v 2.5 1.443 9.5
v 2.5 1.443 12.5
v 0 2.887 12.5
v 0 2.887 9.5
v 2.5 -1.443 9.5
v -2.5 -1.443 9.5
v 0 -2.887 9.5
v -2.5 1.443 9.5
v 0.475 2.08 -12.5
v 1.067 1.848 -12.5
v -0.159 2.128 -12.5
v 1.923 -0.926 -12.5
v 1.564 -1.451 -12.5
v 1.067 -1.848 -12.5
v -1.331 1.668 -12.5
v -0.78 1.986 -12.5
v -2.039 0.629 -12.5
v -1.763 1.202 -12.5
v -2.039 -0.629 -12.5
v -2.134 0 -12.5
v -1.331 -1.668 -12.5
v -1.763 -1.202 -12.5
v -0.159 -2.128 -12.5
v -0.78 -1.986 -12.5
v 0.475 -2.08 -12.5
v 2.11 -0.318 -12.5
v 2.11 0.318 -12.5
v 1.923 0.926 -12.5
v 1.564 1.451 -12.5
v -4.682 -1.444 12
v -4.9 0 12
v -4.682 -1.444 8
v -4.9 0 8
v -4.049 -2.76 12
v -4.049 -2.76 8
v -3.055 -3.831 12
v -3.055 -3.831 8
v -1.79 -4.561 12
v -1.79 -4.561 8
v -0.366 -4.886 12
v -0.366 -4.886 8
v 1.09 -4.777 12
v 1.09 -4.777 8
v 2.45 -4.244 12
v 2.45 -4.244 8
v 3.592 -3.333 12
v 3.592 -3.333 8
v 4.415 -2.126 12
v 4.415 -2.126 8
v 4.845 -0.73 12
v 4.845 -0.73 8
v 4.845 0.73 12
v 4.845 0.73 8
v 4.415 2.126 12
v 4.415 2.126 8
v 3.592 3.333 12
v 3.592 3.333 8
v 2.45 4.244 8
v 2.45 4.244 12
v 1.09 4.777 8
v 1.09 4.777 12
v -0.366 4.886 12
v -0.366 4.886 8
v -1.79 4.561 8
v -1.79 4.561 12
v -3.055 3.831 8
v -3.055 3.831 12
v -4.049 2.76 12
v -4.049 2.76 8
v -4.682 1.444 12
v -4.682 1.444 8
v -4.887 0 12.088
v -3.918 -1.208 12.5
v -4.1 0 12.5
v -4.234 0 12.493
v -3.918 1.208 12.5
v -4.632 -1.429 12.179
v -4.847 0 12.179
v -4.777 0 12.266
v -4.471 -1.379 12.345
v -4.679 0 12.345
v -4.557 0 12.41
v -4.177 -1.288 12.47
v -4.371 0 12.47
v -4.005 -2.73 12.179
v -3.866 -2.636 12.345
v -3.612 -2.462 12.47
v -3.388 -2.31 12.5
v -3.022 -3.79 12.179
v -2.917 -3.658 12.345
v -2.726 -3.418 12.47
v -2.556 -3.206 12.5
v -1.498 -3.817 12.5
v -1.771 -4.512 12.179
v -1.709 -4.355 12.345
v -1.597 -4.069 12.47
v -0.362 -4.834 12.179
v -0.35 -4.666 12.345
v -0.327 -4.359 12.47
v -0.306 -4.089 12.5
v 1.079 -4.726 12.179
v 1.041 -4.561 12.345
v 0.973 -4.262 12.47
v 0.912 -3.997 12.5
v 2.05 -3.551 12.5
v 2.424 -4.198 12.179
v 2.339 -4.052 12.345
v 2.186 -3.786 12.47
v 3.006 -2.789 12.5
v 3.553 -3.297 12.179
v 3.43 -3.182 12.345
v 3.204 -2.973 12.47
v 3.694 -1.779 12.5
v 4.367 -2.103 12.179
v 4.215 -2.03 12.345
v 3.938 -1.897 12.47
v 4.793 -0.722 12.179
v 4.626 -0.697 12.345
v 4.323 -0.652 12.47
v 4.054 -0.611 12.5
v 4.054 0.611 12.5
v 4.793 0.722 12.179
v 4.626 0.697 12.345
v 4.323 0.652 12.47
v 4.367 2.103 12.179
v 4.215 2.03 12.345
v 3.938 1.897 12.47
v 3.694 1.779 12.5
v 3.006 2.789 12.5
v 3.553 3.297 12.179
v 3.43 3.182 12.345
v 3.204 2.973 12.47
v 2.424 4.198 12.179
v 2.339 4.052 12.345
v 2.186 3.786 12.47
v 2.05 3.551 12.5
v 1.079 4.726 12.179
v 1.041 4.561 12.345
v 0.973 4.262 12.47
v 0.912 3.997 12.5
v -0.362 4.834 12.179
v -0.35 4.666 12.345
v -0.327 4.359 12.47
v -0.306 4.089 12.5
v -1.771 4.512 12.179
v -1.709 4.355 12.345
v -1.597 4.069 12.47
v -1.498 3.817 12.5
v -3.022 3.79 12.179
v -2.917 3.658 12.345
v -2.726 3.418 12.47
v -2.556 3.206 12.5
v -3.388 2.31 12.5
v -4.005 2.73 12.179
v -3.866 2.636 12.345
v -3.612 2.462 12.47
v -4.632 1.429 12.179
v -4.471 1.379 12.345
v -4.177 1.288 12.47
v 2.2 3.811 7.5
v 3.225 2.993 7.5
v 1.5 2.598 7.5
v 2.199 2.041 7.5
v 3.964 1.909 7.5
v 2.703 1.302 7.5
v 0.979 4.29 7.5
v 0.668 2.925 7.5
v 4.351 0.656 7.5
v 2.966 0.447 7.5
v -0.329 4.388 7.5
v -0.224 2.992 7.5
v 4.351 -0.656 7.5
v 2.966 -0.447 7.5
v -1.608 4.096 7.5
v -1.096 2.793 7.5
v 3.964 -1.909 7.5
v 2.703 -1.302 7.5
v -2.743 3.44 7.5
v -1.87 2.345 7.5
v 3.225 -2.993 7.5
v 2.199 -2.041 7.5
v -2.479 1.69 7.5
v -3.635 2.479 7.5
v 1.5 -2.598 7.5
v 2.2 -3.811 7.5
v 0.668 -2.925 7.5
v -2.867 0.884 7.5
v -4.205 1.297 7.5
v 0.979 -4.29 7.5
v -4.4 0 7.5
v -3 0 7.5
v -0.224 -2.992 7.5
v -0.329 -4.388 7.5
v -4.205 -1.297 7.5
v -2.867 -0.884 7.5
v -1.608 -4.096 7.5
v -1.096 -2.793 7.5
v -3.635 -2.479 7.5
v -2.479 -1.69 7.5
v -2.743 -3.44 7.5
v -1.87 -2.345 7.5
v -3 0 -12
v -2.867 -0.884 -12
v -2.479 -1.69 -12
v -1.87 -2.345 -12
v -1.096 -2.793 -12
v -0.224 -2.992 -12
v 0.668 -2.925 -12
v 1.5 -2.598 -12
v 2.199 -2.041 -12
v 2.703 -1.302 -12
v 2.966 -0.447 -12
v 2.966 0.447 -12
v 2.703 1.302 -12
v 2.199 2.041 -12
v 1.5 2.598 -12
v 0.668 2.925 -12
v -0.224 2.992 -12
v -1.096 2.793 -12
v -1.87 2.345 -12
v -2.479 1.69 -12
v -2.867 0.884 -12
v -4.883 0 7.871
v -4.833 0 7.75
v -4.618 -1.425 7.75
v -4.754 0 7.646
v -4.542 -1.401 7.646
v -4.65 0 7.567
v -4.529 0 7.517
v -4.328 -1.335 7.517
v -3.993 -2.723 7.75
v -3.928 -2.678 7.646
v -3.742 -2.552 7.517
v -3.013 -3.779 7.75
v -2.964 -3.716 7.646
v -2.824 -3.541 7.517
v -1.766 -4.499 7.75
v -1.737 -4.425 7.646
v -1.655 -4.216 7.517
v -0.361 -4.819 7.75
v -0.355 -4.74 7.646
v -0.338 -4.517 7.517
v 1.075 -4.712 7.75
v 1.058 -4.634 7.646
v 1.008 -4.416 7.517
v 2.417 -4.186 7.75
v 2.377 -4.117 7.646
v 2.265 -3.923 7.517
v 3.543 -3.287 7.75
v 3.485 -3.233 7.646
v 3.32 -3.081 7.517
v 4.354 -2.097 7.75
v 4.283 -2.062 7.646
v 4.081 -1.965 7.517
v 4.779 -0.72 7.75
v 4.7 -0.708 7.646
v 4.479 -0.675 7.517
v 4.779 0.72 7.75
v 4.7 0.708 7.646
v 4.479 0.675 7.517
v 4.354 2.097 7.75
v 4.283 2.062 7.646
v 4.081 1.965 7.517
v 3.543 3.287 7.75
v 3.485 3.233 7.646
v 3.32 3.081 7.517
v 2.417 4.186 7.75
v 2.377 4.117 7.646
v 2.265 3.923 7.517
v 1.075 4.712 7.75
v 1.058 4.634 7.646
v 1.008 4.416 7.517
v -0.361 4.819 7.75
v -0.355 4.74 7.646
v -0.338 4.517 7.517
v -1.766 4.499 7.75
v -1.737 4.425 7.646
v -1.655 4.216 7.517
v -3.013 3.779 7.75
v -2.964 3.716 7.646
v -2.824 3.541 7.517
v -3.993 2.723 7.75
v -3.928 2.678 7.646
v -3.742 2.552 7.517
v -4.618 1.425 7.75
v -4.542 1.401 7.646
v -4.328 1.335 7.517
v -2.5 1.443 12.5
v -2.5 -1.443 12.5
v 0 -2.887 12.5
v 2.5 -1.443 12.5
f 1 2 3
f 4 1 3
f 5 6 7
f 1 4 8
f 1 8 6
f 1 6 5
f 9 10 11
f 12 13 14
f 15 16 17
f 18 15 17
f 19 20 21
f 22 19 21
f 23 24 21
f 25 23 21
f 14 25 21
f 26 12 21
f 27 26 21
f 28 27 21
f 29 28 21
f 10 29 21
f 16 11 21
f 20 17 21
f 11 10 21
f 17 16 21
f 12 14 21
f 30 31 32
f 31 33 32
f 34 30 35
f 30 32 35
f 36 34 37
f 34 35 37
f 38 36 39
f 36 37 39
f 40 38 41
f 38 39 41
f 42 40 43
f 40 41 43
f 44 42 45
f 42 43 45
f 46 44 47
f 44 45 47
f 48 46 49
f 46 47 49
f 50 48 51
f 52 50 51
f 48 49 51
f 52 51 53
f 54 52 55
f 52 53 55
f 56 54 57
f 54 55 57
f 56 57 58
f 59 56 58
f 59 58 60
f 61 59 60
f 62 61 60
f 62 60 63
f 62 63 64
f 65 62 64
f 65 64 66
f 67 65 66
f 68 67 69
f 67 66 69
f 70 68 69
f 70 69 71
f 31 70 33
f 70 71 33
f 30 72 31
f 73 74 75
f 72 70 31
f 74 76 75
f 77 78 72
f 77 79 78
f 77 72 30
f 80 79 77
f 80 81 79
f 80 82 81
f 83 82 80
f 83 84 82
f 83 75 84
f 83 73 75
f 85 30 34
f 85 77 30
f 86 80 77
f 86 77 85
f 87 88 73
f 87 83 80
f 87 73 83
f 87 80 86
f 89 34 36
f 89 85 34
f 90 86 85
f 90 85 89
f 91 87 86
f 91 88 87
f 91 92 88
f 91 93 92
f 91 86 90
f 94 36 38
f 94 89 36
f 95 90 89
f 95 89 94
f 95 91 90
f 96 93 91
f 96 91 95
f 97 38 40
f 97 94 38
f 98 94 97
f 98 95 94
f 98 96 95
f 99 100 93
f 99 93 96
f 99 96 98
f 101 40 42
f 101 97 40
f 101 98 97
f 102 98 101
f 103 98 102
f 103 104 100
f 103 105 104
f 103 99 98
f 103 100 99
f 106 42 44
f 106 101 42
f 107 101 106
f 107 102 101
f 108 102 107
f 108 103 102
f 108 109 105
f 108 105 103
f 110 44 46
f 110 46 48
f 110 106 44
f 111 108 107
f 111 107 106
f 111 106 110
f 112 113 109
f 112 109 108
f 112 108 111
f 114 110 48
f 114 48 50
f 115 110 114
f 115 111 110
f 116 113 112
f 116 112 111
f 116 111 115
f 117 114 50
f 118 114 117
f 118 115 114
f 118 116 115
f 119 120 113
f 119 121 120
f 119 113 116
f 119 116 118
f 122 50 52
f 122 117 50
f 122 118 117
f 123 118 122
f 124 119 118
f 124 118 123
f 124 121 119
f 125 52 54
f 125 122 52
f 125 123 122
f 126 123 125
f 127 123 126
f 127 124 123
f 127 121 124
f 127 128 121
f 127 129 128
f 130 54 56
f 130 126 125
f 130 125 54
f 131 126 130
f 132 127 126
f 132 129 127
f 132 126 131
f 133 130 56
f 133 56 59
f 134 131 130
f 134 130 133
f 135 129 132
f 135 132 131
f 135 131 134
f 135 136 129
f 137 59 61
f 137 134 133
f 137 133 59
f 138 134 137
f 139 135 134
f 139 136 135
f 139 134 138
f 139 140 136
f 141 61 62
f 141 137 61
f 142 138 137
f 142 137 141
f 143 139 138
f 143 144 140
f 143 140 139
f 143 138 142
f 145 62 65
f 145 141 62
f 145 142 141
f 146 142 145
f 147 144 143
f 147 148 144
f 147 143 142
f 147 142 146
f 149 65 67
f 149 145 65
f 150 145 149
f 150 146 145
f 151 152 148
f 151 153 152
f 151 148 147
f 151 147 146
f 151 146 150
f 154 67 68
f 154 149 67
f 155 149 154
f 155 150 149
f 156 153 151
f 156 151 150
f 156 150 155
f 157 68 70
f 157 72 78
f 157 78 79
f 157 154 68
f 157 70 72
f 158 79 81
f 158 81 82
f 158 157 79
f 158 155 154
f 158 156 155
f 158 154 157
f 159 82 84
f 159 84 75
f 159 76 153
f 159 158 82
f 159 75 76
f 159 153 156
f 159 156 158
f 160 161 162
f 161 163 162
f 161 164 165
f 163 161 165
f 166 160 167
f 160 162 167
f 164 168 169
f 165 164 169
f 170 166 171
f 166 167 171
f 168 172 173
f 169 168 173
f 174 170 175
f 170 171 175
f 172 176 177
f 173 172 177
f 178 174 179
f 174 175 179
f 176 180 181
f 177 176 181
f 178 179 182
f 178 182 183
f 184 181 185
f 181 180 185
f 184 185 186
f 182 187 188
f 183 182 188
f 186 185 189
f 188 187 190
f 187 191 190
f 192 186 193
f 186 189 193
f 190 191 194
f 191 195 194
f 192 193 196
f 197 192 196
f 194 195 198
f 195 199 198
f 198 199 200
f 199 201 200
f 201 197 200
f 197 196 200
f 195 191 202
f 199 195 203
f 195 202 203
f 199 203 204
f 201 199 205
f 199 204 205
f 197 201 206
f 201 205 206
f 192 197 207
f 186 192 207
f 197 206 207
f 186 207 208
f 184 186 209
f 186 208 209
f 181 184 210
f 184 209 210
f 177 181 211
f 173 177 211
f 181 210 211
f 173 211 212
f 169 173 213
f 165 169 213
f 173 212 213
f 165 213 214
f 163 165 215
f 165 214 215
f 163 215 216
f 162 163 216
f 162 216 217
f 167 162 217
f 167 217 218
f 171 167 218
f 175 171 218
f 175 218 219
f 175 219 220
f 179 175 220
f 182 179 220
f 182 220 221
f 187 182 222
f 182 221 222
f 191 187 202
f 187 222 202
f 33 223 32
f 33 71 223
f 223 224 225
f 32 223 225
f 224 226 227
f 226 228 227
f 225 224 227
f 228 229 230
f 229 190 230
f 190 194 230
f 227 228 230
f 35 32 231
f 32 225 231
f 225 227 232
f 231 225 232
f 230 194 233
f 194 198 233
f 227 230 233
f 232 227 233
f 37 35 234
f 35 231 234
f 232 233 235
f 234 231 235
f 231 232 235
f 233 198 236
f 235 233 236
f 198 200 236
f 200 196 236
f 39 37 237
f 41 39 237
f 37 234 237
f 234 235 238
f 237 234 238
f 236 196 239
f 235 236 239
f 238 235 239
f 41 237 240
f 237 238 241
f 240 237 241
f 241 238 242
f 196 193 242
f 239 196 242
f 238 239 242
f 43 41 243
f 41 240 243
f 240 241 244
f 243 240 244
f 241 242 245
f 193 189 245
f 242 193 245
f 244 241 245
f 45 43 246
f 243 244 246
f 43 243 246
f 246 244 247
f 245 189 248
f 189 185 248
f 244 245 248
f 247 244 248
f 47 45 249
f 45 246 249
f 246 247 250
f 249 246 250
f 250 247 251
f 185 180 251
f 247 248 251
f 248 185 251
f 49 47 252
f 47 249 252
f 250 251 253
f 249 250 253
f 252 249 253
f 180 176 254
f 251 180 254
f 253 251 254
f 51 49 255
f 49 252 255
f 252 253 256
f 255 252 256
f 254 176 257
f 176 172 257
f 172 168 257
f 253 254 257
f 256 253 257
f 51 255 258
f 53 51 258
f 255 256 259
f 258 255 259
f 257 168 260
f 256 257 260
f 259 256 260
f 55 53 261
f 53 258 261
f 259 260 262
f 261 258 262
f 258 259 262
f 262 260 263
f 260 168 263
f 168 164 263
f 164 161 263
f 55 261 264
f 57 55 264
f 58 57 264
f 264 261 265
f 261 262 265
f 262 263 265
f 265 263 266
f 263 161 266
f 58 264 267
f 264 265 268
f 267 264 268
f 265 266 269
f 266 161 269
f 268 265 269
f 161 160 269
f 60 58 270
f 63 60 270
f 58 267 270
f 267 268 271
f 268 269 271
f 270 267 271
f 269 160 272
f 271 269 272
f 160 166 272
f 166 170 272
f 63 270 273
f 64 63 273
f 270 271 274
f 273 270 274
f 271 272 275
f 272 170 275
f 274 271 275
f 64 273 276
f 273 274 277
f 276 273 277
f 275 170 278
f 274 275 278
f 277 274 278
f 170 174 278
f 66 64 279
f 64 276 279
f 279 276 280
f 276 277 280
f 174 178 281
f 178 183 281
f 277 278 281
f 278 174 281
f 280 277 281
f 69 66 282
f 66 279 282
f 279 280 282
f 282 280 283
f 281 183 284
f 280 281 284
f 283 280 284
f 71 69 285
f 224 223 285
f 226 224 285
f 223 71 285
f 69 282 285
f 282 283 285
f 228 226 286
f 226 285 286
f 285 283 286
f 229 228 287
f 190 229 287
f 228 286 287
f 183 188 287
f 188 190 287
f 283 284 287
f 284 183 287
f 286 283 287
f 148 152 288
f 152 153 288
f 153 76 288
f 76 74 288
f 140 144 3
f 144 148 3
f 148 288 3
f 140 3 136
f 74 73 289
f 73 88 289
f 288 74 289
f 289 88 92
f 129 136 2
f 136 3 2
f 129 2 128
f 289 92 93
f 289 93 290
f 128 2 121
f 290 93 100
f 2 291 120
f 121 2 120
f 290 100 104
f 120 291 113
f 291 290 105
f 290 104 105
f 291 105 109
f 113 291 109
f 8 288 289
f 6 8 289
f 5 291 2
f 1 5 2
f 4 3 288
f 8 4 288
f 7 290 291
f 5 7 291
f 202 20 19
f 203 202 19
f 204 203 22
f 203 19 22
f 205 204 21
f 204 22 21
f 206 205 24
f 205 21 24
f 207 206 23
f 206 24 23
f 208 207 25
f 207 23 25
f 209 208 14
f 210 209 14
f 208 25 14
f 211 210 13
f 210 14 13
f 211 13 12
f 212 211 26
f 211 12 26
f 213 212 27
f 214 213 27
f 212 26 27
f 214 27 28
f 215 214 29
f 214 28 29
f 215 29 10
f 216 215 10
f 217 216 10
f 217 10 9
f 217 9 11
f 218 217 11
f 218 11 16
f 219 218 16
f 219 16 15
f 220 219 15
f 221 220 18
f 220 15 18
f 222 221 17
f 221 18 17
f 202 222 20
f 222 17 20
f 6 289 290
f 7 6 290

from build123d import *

# Parameters (mm, degrees)
FILLET_1_R          = 0.5
FILLET_2_SIZE       = 0.5
FILLET_2_SIZE_2     = 0.8
CHAMFER_1_SIZE      = 0.5
CHAMFER_1_SIZE2     = 0.866025404
CUT_EXTRUDE_1_DEPTH = 3


with BuildPart() as part:
    # 草图2 → 旋转1 (revolve)
    with BuildSketch(Plane(origin=(0, 0, 0), x_dir=(0, 0, -1), z_dir=(1, 0, 0)), mode=Mode.PRIVATE) as revolve_1_sk:
        Polygon((-12.5, 0), (-12.5, 4.9), (-7.5, 4.9), (-7.5, 3), (12.5, 3), (12.5, 0), align=None)
    revolve(revolve_1_sk.sketch.rotate(Axis((0, 0, -12.5), (0, 0, 1)), 90), axis=Axis((0, 0, -12.5), (0, 0, 1)))

    # 圆角1
    fillet_1_edges = [part.edges().sort_by_distance(p)[0] for p in [
        (4.9, 0, 7.5),
    ]]
    fillet(fillet_1_edges, radius=FILLET_1_R)

    # 圆角2
    # an asymmetric fillet: 0.8, 0.5 mm, written as the material it takes off along each edge
    with BuildSketch(Plane(origin=(0, 0, 12.5), x_dir=(-1, 0, 0), z_dir=(0, 1, 0))) as fillet_2_piece_1:
        with BuildLine():
            Bezier((4.9, -FILLET_2_SIZE), (4.9, 0), (4.9 - FILLET_2_SIZE_2, 0), weights=[1, 0.707106781, 1])
            Line((4.9 - FILLET_2_SIZE_2, 0), (4.9, 0))
            Line((4.9, 0), (4.9, -FILLET_2_SIZE))
        make_face()
    revolve(axis=Axis((0, 0, 12.5), (0, 0, 1)), mode=Mode.SUBTRACT)

    # 倒角1
    chamfer_1_edges = [part.edges().sort_by_distance(p)[0] for p in [
        (3, 0, -12.5),
    ]]
    chamfer_1_side = [part.faces().sort_by_distance(p)[0] for p in [
        (3, 0, -2.5),
    ]]
    chamfer(chamfer_1_edges, length=CHAMFER_1_SIZE, length2=CHAMFER_1_SIZE2, reference=chamfer_1_side[0])

    # 草图3 → 切除-拉伸1 (cut)
    with BuildSketch(Plane.XY.offset(12.5)):
        Polygon((0, 2.886751346), (-2.5, 1.443375673), (-2.5, -1.443375673), (0, -2.886751346), (2.5, -1.443375673), (2.5, 1.443375673), align=None)
    extrude(amount=-CUT_EXTRUDE_1_DEPTH, mode=Mode.SUBTRACT)


solid = part.part
